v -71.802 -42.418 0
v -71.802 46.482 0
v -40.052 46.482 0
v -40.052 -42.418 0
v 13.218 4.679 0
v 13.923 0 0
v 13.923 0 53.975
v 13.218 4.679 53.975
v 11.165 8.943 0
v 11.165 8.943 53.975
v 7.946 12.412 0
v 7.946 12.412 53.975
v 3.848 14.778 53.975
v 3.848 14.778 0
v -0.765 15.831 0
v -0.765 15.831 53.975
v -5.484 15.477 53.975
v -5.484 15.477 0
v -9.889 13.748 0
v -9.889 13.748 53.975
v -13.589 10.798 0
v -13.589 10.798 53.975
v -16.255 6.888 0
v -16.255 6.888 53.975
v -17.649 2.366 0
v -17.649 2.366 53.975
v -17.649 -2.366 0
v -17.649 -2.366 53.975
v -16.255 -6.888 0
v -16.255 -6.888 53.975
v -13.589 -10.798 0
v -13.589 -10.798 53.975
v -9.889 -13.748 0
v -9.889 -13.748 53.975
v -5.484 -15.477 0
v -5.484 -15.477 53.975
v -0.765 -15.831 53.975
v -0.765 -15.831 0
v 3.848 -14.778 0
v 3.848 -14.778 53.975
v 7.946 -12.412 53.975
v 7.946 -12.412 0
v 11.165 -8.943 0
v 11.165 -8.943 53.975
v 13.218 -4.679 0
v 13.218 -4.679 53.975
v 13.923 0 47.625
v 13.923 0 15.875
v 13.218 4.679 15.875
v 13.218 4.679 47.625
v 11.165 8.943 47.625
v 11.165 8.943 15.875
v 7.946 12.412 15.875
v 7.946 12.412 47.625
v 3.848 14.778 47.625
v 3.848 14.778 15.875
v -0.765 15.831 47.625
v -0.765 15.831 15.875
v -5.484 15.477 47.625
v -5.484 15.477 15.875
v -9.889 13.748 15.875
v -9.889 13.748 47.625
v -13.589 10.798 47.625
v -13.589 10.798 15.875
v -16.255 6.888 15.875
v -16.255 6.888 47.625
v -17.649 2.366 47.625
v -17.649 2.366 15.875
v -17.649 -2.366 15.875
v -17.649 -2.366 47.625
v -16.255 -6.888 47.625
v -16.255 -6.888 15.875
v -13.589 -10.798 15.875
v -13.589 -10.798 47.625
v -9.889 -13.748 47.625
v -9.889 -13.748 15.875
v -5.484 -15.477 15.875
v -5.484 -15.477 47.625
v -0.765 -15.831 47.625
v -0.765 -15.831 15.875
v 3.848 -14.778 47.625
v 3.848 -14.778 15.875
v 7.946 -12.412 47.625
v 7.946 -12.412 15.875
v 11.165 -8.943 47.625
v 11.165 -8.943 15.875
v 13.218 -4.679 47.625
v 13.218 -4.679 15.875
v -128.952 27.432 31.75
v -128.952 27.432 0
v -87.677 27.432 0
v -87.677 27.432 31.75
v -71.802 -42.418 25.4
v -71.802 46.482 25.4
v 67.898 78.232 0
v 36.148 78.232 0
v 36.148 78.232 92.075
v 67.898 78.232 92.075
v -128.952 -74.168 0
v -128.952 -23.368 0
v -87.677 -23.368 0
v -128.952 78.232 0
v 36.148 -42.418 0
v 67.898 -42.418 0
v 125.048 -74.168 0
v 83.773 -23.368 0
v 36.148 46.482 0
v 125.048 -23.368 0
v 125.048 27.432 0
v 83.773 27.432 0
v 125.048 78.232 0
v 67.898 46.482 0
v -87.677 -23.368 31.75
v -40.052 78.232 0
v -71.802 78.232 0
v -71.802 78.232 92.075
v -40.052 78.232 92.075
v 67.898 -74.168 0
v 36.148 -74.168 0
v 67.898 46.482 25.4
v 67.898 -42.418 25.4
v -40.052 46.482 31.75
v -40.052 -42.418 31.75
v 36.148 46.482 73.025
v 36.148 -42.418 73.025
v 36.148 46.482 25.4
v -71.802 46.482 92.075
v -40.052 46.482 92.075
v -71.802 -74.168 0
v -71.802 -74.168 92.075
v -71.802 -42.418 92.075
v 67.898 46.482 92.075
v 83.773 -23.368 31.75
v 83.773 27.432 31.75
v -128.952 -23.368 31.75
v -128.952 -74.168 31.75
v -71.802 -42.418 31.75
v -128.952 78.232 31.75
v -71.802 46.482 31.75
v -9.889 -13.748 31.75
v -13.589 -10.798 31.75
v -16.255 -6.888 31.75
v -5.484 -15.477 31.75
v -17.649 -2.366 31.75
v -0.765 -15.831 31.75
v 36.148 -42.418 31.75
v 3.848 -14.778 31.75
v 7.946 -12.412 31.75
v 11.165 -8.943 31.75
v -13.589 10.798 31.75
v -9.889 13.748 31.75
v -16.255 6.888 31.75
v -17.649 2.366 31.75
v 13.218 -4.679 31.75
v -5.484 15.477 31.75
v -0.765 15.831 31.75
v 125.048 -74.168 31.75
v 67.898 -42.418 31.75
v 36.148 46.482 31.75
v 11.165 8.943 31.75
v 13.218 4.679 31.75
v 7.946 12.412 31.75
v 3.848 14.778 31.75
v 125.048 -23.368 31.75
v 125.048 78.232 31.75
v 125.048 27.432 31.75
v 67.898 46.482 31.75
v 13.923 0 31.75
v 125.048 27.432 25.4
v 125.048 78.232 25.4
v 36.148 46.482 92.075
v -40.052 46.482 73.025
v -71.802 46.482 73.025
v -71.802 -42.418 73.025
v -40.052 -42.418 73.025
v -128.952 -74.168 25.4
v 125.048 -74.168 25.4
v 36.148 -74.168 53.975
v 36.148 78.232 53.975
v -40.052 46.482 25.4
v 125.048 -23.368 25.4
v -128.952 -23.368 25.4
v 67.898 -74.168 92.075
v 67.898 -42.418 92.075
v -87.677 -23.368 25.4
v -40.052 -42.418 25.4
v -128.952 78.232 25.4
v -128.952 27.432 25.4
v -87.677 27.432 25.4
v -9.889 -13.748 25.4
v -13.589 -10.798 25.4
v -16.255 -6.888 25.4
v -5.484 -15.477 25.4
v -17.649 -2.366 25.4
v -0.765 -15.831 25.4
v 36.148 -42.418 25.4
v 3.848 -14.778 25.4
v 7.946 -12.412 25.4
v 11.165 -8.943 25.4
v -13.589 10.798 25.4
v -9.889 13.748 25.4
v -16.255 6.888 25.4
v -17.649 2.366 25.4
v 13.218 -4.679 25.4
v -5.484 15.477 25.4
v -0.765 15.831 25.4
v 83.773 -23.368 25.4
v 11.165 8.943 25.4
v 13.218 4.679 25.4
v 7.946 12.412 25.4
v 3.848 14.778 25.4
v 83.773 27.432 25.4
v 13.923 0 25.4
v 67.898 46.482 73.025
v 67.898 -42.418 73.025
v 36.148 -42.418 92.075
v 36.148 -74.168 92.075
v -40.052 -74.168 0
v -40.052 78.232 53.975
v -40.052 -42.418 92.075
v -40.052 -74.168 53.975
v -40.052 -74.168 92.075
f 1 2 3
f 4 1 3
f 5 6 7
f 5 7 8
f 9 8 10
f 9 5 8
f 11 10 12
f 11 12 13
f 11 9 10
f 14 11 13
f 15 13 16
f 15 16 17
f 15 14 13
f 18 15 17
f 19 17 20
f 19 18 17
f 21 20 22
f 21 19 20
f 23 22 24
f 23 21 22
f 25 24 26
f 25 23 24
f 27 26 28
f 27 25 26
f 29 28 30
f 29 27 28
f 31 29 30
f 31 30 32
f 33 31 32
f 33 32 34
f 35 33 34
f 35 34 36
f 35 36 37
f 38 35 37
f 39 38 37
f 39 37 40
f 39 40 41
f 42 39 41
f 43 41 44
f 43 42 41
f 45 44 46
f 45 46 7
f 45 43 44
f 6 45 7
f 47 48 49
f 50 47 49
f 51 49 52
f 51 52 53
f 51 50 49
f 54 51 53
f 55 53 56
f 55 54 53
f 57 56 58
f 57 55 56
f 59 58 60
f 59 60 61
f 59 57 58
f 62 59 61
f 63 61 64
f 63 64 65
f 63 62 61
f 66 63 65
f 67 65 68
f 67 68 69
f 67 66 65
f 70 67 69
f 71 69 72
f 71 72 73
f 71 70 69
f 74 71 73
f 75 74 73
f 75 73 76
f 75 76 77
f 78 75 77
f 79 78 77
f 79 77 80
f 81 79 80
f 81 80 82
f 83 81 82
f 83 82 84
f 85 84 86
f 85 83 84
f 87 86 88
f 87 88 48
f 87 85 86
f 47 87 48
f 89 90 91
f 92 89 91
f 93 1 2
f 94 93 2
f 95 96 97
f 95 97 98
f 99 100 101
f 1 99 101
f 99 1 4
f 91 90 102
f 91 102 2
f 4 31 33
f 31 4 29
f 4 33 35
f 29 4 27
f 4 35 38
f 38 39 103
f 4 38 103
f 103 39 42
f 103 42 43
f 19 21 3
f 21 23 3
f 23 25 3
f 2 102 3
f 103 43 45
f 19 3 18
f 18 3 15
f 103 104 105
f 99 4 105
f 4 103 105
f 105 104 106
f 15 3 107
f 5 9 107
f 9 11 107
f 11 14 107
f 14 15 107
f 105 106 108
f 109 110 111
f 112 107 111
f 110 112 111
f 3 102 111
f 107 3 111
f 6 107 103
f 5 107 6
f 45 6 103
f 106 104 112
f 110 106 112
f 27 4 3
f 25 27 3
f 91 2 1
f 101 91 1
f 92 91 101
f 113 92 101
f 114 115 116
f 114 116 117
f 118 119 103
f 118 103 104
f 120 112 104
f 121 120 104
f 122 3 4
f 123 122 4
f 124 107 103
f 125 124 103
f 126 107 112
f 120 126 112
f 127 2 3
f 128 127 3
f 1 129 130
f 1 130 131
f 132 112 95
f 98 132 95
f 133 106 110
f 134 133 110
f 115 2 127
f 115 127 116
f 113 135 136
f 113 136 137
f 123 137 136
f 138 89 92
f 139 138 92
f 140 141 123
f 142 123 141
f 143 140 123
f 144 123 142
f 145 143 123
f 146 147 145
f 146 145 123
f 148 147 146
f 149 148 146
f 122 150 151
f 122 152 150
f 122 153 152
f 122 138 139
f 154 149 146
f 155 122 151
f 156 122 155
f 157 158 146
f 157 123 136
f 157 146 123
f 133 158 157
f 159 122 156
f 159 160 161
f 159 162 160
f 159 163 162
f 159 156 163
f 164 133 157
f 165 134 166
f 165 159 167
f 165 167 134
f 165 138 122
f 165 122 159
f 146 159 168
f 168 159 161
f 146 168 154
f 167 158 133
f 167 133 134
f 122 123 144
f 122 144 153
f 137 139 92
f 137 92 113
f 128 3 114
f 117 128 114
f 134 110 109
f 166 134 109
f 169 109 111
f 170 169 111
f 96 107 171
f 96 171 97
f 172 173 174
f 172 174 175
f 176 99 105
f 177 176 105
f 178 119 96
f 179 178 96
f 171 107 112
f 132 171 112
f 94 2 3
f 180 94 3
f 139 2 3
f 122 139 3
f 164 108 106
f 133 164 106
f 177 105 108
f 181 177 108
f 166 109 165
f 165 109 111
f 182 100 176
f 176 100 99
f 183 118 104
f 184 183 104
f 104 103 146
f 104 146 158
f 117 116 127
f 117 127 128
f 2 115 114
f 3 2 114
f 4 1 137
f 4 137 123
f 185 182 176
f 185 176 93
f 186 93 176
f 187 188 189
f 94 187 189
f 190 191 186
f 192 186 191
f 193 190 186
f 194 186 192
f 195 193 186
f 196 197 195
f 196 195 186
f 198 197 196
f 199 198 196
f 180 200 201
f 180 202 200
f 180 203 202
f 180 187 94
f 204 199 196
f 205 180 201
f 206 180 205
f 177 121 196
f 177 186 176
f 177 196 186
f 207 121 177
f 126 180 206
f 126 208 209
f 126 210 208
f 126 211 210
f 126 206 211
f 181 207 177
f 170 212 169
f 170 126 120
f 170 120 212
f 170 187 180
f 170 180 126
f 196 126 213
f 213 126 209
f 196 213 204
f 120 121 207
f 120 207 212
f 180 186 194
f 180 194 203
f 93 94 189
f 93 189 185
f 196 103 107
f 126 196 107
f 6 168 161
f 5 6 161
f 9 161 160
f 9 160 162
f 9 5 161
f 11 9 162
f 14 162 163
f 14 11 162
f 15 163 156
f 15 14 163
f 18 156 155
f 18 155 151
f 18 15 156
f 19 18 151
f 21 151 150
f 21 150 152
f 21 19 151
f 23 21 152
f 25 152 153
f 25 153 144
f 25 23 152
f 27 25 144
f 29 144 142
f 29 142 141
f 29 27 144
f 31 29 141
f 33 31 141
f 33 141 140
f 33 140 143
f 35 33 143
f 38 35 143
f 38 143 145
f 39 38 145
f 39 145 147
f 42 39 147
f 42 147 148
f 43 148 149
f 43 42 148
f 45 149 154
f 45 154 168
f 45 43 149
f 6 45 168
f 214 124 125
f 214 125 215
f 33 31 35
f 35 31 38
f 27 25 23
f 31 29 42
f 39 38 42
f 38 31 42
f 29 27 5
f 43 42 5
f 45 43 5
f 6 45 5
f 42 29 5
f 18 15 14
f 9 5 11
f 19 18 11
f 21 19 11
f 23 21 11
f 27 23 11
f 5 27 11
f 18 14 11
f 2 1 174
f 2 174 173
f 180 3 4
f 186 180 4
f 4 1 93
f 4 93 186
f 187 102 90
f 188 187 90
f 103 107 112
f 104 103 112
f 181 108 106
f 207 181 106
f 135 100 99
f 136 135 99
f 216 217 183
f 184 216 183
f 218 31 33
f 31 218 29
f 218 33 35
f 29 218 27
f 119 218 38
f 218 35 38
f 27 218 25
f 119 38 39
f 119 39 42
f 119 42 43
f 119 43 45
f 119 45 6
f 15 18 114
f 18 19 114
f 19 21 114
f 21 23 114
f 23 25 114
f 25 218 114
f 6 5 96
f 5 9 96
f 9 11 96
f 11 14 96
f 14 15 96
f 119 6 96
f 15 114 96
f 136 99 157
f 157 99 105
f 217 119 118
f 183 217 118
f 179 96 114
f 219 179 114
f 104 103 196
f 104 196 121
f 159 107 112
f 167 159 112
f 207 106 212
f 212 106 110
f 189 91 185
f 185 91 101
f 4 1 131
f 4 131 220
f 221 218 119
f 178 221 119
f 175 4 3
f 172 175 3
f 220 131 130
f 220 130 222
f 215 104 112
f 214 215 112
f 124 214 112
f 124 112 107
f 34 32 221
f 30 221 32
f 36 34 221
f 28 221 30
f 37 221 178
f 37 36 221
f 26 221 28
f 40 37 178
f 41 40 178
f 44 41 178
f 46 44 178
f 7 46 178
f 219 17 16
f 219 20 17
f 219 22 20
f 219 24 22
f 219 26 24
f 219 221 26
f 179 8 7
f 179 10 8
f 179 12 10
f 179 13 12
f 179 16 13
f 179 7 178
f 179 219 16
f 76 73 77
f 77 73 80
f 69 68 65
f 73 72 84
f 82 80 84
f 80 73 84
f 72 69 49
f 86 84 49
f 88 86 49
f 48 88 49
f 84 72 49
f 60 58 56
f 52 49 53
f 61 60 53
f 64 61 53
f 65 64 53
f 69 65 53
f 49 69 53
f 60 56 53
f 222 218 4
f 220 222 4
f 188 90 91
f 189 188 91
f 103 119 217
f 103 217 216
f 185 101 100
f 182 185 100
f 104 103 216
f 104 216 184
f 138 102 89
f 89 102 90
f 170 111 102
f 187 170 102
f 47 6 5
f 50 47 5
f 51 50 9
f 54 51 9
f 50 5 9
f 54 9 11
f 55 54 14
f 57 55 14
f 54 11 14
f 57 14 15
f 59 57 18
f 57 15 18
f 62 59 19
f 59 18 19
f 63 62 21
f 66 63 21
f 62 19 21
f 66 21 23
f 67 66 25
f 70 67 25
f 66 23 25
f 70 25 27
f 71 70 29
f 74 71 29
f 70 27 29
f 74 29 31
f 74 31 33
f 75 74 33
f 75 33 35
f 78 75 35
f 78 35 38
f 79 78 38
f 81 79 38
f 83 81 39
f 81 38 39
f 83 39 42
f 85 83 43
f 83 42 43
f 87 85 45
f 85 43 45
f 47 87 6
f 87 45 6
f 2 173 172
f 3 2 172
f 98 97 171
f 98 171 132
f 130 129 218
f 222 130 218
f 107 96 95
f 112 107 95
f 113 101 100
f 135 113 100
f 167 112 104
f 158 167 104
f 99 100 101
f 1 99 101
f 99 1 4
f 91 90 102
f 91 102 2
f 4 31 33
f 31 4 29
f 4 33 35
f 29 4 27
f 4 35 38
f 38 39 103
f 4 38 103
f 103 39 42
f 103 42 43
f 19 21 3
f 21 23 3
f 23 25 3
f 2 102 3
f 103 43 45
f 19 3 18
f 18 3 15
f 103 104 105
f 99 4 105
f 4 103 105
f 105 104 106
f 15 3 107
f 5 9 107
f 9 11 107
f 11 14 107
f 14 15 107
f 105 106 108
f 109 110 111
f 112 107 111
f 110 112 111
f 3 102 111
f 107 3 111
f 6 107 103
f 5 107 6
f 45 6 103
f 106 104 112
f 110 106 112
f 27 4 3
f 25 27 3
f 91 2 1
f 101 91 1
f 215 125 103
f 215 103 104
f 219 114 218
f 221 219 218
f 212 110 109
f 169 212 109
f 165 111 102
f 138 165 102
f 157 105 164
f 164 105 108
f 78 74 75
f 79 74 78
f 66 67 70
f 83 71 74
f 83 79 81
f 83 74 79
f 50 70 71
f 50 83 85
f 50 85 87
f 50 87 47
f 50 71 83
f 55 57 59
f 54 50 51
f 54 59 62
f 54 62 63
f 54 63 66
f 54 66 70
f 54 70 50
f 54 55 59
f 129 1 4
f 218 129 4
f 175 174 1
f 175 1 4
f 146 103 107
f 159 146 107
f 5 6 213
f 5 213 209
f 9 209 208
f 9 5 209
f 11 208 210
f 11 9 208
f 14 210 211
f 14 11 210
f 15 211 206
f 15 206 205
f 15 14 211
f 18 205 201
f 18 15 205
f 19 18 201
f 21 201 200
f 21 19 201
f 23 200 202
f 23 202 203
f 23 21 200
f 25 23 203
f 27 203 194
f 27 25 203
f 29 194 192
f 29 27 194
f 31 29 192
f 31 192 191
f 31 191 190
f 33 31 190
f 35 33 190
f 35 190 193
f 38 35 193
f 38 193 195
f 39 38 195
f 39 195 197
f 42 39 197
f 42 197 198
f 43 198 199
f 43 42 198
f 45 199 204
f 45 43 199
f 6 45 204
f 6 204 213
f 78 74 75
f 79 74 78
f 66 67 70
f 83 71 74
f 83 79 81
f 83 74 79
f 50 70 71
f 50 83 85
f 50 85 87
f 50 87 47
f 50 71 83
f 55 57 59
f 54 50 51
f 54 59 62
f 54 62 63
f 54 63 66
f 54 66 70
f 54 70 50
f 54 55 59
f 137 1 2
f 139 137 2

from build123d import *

# Parameters (mm, degrees)
F0_W     = 31.75
F0_H     = 31.75
F2_DEPTH = 92.075
F1_R     = 15.875
F3_DEPTH = 53.975
F0_R     = 15.875
F4_DEPTH = 31.75
F5_DEPTH = 25.4
F0_H_2   = 88.9
F6_DEPTH = 73.025
F7_DEPTH = 47.625
F8_DEPTH = 31.75


with BuildPart() as f2:
    # F0 (on Top) → F2 (new body)
    with BuildSketch(Plane.XY):
        with Locations((-55.9267913461, -58.2929519415)):
            Rectangle(F0_W, F0_H)
    extrude(amount=F2_DEPTH)


with BuildPart() as f2b:
    # F0 (on Top) → F2, piece 2 (new body)
    with BuildSketch(Plane.XY):
        with Locations((52.0232086539, 62.3570480585)):
            Rectangle(F0_W, F0_H)
    extrude(amount=F2_DEPTH)


with BuildPart() as f2c:
    # F0 (on Top) → F2, piece 3 (new body)
    with BuildSketch(Plane.XY):
        with Locations((52.0232086539, -58.2929519415)):
            Rectangle(F0_W, F0_H)
    extrude(amount=F2_DEPTH)


with BuildPart() as f2d:
    # F0 (on Top) → F2, piece 4 (new body)
    with BuildSketch(Plane.XY):
        with Locations((-55.9267913461, 62.3570480585)):
            Rectangle(F0_W, F0_H)
    extrude(amount=F2_DEPTH)


with BuildPart() as f3:
    # F1 (on face) → F3 (new body)
    with BuildSketch(Plane.XY):
        Polygon((36.1482086539, 78.2320480585), (-1.9517913461, 78.2320480585), (-40.0517913461, 78.2320480585), (-40.0517913461, 46.4820480585), (-40.0517913461, -42.4179519415), (-40.0517913461, -74.1679519415), (-1.9517913461, -74.1679519415), (36.1482086539, -74.1679519415), (36.1482086539, -42.4179519415), (36.1482086539, 0), (36.1482086539, 46.4820480585), align=None)
        with Locations((-1.9517913461, 0)):
            Circle(F1_R, mode=Mode.SUBTRACT)
    extrude(amount=F3_DEPTH)


with BuildPart() as f4:
    # F0 (on Top) → F4 (new body)
    with BuildSketch(Plane.XY):
        Polygon((-71.8017913461, 78.2320480585), (-128.9517913461, 78.2320480585), (-128.9517913461, 27.4320480585), (-87.6767913461, 27.4320480585), (-87.6767913461, -23.3679519415), (-128.9517913461, -23.3679519415), (-128.9517913461, -74.1679519415), (-71.8017913461, -74.1679519415), (-71.8017913461, -42.4179519415), (-71.8017913461, 46.4820480585), align=None)
        with Locations((-55.9267913461, 62.3570480585)):
            Rectangle(F0_W, F0_H)
        Polygon((-1.9517913461, 78.2320480585), (-40.0517913461, 78.2320480585), (-40.0517913461, 46.4820480585), (-40.0517913461, -42.4179519415), (-40.0517913461, -74.1679519415), (-1.9517913461, -74.1679519415), (36.1482086539, -74.1679519415), (36.1482086539, -42.4179519415), (36.1482086539, 0), (36.1482086539, 46.4820480585), (36.1482086539, 78.2320480585), align=None)
        with Locations((-1.9517913461, 0)):
            Circle(F0_R, mode=Mode.SUBTRACT)
        with Locations((-55.9267913461, -58.2929519415)):
            Rectangle(F0_W, F0_H)
        with Locations((52.0232086539, 62.3570480585)):
            Rectangle(F0_W, F0_H)
        Polygon((125.0482086539, 78.2320480585), (67.8982086539, 78.2320480585), (67.8982086539, 46.4820480585), (67.8982086539, -42.4179519415), (67.8982086539, -74.1679519415), (125.0482086539, -74.1679519415), (125.0482086539, -23.3679519415), (83.7732086539, -23.3679519415), (83.7732086539, 27.4320480585), (125.0482086539, 27.4320480585), align=None)
        with Locations((52.0232086539, -58.2929519415)):
            Rectangle(F0_W, F0_H)
    extrude(amount=F4_DEPTH)


with BuildPart() as f5:
    # F0 (on Top) → F5 (new body)
    with BuildSketch(Plane.XY):
        Polygon((-71.8017913461, 78.2320480585), (-128.9517913461, 78.2320480585), (-128.9517913461, 27.4320480585), (-87.6767913461, 27.4320480585), (-87.6767913461, -23.3679519415), (-128.9517913461, -23.3679519415), (-128.9517913461, -74.1679519415), (-71.8017913461, -74.1679519415), (-71.8017913461, -42.4179519415), (-71.8017913461, 46.4820480585), align=None)
        with Locations((-55.9267913461, 62.3570480585)):
            Rectangle(F0_W, F0_H)
        Polygon((-1.9517913461, 78.2320480585), (-40.0517913461, 78.2320480585), (-40.0517913461, 46.4820480585), (-40.0517913461, -42.4179519415), (-40.0517913461, -74.1679519415), (-1.9517913461, -74.1679519415), (36.1482086539, -74.1679519415), (36.1482086539, -42.4179519415), (36.1482086539, 0), (36.1482086539, 46.4820480585), (36.1482086539, 78.2320480585), align=None)
        with Locations((-1.9517913461, 0)):
            Circle(F0_R, mode=Mode.SUBTRACT)
        with Locations((-55.9267913461, -58.2929519415)):
            Rectangle(F0_W, F0_H)
        with Locations((52.0232086539, 62.3570480585)):
            Rectangle(F0_W, F0_H)
        Polygon((125.0482086539, 78.2320480585), (67.8982086539, 78.2320480585), (67.8982086539, 46.4820480585), (67.8982086539, -42.4179519415), (67.8982086539, -74.1679519415), (125.0482086539, -74.1679519415), (125.0482086539, -23.3679519415), (83.7732086539, -23.3679519415), (83.7732086539, 27.4320480585), (125.0482086539, 27.4320480585), align=None)
        with Locations((52.0232086539, -58.2929519415)):
            Rectangle(F0_W, F0_H)
    extrude(amount=F5_DEPTH)


with BuildPart() as f6:
    # F0 (on Top) → F6 (new body)
    with BuildSketch(Plane.XY):
        with Locations((-55.9267913461, 2.0320480585)):
            Rectangle(F0_W, F0_H_2)
    extrude(amount=F6_DEPTH)


with BuildPart() as f6b:
    # F0 (on Top) → F6, piece 2 (new body)
    with BuildSketch(Plane.XY):
        Polygon((67.8982086539, 46.4820480585), (36.1482086539, 46.4820480585), (36.1482086539, 0), (36.1482086539, -42.4179519415), (67.8982086539, -42.4179519415), align=None)
    extrude(amount=F6_DEPTH)


with BuildPart() as f7:
    # F0 (on Top) → F7 (new body)
    with BuildSketch(Plane.XY):
        with Locations((-1.9517913461, 0)):
            Circle(F0_R)
    extrude(amount=F7_DEPTH)


with BuildPart() as f8:
    # F8 (new): a face of the model
    f8_faces = [f7.part.faces().sort_by_distance(p)[0] for p in [
        (-1.9517913461, 0, 47.625),
    ]]
    extrude(f8_faces, amount=-F8_DEPTH)


solid = Compound([f2.part, f2b.part, f2c.part, f2d.part, f3.part, f4.part, f5.part, f6.part, f6b.part, f7.part, f8.part])
